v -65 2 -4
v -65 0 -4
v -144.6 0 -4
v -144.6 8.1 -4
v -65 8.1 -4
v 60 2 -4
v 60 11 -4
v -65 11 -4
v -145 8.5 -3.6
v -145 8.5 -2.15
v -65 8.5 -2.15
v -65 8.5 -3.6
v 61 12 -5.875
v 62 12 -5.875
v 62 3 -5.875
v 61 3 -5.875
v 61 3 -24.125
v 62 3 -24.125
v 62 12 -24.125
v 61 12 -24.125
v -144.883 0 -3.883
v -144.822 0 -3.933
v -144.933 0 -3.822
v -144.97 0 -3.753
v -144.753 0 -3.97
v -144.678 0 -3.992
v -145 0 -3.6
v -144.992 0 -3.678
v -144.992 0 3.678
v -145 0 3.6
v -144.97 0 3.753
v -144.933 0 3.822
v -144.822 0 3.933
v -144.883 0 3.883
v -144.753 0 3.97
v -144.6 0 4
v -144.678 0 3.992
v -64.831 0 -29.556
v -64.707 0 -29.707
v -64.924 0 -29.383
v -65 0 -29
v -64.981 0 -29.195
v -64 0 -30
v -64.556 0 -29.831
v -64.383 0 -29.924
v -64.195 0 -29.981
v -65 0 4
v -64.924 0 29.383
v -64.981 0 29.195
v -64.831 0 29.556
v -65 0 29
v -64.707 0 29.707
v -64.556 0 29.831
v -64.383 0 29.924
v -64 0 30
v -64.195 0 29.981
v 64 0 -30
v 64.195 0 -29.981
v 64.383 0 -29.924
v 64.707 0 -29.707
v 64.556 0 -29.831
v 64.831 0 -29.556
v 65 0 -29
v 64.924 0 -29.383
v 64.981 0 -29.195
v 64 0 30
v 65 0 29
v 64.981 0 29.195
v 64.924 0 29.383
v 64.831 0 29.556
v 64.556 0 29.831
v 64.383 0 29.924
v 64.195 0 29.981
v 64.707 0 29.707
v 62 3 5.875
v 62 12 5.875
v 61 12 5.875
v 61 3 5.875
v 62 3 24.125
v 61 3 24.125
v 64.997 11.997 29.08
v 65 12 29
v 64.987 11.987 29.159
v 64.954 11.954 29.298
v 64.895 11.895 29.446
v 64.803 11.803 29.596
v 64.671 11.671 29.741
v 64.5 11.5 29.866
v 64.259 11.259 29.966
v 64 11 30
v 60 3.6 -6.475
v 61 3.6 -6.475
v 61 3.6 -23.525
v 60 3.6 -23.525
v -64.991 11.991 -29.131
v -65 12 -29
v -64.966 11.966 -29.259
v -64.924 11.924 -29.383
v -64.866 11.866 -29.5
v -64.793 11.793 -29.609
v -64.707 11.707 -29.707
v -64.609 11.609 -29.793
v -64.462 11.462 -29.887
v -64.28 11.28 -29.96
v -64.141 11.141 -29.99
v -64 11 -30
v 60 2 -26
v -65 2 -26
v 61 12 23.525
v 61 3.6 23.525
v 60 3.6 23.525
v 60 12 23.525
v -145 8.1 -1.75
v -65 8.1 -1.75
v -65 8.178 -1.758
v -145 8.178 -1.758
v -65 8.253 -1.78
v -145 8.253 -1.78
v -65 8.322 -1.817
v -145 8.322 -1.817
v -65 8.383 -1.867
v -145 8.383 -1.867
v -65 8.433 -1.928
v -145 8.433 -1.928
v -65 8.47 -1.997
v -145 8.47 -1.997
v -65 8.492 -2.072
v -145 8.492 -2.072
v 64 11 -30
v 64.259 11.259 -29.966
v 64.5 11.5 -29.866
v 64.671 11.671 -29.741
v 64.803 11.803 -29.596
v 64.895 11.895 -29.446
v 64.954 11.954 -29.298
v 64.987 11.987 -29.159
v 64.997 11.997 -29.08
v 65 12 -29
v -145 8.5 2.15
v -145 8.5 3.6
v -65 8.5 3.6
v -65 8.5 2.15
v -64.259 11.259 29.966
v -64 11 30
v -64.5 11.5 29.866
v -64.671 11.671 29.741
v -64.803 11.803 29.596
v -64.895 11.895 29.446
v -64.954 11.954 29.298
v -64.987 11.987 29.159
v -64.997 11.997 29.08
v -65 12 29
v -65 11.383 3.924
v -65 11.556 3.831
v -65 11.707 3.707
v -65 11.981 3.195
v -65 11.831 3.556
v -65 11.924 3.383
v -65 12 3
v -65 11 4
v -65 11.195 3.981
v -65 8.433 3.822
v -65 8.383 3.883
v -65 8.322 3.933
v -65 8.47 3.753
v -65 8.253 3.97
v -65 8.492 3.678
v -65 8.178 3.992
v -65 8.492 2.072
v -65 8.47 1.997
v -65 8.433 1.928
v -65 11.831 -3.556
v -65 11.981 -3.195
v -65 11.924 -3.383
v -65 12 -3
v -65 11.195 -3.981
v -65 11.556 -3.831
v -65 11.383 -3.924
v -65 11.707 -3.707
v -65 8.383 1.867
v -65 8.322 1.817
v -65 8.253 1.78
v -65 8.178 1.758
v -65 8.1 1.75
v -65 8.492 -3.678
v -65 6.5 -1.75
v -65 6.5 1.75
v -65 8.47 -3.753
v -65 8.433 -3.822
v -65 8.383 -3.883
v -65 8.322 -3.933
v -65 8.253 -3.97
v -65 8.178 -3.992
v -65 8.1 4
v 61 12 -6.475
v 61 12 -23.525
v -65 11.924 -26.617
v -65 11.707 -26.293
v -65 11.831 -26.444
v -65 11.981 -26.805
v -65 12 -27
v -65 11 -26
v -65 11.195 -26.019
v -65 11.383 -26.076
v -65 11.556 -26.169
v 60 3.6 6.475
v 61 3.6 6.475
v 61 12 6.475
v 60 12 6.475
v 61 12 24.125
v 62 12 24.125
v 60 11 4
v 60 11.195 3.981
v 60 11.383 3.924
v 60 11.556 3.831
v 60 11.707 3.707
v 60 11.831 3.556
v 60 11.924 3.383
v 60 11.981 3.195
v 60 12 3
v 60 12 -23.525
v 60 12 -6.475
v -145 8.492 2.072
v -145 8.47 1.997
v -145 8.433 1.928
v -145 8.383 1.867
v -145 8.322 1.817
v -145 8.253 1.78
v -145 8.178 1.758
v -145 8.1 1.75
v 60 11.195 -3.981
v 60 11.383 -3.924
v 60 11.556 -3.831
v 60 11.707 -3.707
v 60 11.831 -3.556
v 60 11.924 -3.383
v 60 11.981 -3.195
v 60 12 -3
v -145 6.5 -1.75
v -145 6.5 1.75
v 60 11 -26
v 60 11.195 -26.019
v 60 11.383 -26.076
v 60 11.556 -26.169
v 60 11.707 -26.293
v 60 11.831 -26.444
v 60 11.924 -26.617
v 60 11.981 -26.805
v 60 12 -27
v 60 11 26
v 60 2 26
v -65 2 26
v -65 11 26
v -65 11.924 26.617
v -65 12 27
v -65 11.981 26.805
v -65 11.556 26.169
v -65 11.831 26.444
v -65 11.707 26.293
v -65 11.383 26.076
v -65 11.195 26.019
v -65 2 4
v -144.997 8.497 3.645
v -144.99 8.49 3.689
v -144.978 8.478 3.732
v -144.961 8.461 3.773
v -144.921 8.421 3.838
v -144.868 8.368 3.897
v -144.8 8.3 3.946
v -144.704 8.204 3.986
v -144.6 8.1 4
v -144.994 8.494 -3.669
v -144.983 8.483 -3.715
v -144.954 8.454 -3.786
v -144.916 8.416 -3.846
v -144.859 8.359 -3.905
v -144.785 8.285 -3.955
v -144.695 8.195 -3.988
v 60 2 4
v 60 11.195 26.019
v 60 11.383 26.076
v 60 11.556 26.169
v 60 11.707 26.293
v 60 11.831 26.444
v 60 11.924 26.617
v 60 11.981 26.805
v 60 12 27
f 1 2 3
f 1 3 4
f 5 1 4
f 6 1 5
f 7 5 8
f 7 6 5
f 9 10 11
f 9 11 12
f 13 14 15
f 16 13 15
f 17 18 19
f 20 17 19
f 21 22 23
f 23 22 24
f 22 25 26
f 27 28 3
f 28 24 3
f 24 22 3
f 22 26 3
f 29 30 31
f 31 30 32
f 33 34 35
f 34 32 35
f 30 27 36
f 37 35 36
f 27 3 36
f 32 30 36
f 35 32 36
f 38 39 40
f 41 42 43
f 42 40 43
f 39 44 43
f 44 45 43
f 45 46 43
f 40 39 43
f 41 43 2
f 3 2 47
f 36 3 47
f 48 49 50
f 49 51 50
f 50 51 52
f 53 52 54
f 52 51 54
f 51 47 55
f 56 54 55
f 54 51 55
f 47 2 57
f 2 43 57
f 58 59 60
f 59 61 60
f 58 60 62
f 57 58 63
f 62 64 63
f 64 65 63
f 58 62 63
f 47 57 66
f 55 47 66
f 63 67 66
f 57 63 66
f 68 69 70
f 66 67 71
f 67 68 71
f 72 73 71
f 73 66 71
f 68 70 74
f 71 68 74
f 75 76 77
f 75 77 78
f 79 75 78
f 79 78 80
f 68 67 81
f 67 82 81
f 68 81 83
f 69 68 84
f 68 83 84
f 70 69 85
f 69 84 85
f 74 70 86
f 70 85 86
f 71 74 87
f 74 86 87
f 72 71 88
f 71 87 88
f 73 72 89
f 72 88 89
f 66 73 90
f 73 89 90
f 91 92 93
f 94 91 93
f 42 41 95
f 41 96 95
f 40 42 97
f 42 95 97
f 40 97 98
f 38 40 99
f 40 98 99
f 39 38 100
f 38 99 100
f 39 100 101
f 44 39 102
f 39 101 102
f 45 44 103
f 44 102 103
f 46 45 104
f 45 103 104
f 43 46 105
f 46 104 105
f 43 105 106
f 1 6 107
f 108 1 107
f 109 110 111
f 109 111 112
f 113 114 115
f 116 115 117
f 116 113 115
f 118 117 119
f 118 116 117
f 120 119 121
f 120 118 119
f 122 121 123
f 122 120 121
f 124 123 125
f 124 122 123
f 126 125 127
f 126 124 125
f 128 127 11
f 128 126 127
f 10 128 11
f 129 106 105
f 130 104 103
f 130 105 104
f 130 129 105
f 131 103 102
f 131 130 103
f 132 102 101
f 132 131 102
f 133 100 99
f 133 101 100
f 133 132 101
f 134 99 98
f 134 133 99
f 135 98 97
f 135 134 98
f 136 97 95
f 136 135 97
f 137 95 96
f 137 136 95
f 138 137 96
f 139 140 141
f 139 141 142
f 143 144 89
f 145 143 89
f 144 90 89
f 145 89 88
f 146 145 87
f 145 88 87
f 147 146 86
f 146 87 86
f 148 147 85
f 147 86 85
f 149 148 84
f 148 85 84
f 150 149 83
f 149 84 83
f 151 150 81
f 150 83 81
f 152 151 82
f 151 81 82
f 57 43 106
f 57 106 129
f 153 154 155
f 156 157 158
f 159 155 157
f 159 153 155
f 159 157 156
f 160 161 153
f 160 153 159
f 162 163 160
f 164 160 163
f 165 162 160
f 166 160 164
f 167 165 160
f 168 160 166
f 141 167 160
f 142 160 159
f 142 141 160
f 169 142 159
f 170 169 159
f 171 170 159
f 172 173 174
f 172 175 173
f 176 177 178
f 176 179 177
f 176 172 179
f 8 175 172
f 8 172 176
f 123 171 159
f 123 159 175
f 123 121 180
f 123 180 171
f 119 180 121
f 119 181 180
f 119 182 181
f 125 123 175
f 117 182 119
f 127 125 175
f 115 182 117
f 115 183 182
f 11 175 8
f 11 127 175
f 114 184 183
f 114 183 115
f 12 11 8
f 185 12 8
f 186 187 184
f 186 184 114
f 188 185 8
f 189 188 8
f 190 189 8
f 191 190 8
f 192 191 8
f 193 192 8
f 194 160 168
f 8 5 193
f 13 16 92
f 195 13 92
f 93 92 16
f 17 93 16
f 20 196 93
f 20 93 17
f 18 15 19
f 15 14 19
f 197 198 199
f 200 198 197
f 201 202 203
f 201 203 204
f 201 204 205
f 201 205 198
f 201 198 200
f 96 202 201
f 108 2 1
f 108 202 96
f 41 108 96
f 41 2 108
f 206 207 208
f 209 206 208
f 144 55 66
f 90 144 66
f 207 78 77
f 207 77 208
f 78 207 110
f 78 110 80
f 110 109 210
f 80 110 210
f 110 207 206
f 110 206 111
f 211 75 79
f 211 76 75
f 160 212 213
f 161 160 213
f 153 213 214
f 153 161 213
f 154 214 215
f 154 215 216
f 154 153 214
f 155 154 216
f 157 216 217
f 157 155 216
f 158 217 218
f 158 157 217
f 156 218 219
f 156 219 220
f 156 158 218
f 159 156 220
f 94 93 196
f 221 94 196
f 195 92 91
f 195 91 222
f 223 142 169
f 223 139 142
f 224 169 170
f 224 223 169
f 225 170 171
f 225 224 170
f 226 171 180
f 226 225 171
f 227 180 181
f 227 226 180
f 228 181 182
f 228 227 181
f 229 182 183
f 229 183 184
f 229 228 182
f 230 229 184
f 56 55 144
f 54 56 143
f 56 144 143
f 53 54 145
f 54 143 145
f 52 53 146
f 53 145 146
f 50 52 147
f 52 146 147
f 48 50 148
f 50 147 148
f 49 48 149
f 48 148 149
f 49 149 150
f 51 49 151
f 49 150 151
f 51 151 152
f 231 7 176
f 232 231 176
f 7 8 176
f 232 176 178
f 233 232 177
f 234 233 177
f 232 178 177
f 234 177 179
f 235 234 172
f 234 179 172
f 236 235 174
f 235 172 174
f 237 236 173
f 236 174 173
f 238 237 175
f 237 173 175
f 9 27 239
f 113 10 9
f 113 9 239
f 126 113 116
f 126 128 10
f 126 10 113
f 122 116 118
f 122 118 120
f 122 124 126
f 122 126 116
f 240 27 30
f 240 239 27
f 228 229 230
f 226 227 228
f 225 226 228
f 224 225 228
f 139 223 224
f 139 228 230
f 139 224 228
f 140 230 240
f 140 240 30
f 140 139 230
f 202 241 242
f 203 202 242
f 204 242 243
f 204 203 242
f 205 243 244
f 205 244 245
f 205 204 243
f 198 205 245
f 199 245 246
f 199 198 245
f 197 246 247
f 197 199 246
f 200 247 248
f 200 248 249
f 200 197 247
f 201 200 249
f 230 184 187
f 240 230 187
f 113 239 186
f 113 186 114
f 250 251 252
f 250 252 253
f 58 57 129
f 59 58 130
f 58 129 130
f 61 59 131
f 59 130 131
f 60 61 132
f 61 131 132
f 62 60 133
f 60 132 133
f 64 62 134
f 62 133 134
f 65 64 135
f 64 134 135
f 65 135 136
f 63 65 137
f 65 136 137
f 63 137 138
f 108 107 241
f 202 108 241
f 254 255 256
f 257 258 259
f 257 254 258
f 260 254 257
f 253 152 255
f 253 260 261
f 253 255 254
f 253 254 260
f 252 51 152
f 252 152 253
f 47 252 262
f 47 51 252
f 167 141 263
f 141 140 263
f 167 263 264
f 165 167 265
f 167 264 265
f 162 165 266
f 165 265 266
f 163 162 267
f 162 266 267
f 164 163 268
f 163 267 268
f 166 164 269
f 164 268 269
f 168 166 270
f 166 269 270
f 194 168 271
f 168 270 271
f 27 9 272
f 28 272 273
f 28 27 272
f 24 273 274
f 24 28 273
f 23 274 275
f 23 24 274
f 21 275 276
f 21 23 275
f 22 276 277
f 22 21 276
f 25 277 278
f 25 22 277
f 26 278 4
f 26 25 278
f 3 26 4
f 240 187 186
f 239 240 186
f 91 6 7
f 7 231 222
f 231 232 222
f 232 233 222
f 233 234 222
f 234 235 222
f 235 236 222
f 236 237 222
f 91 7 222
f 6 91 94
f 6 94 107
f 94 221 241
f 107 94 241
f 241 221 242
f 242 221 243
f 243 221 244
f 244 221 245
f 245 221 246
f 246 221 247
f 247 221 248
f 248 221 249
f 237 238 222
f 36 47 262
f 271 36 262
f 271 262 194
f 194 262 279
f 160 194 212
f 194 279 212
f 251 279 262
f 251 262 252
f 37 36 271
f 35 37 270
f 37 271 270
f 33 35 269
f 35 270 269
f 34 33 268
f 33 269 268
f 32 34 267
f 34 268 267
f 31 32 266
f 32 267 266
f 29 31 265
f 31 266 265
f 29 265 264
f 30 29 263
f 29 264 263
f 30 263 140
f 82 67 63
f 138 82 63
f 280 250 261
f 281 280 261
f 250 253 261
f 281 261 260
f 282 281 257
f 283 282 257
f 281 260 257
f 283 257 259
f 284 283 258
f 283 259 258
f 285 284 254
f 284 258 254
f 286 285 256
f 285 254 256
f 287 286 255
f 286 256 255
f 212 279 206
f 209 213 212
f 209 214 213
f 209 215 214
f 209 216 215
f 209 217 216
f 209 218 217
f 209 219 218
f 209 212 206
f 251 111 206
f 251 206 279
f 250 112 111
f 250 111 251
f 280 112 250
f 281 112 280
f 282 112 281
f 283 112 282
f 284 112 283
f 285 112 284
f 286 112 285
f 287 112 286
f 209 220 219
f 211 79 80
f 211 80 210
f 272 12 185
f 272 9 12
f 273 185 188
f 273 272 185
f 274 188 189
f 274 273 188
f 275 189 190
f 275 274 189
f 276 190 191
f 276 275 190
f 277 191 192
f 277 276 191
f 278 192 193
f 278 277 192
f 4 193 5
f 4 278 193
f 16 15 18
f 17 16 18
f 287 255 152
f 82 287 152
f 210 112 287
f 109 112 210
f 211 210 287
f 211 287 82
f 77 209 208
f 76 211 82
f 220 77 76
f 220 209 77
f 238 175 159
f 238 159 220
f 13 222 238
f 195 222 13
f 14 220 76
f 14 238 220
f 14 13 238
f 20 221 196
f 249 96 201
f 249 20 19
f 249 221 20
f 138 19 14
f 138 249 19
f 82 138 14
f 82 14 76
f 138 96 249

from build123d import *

# Parameters (mm, degrees)
SKETCH1_W           = 130
SKETCH1_H           = 60
BOSS_EXTRUDE1_DEPTH = 12
CUT_EXTRUDE1_START  = -5
SKETCH2_W           = 22
SKETCH2_H           = 10
CUT_EXTRUDE1_DEPTH  = 129.955216397
CUT_EXTRUDE2_START  = -2
SKETCH3_W           = 0.6
SKETCH3_H           = 8.4
SKETCH3_H_2         = 0.6
SKETCH3_W_2         = 17.05
CUT_EXTRUDE2_DEPTH  = 1
CUT_EXTRUDE3_START  = -2
SKETCH3_3_W         = 17.05
SKETCH3_3_H         = 8.4
CUT_EXTRUDE3_DEPTH  = 2
BOSS_EXTRUDE2_DEPTH = 80
FILLET1_R           = 0.4
FILLET2_R           = 1


with BuildPart() as part:
    # Sketch1 → Boss-Extrude1 (new body)
    with BuildSketch(Plane(origin=(0, 0, 0), x_dir=(1, 0, 0), z_dir=(0, 1, 0))):
        Rectangle(SKETCH1_W, SKETCH1_H)
    extrude(amount=BOSS_EXTRUDE1_DEPTH)

    # Sketch2 → Cut-Extrude1 (cut, through all)
    with BuildSketch(Plane(origin=(65, 0, 0), x_dir=(0, 0, -1), z_dir=(1, 0, 0)).offset(CUT_EXTRUDE1_START)):
        with Locations((15, 7)):
            Rectangle(SKETCH2_W, SKETCH2_H)
    cut_extrude1 = extrude(amount=-CUT_EXTRUDE1_DEPTH, mode=Mode.SUBTRACT)

    # Mirror1: Cut-Extrude1 across plane
    add(cut_extrude1.mirror(Plane.XY), mode=Mode.SUBTRACT)

    # Sketch3 → Cut-Extrude2 (cut)
    with BuildSketch(Plane.ZY.offset(-60).offset(CUT_EXTRUDE2_START)):
        with Locations((23.825, 7.8)):
            Rectangle(SKETCH3_W, SKETCH3_H)
        with Locations((23.825, 3.3)):
            Rectangle(SKETCH3_W, SKETCH3_H_2)
        with Locations((15, 7.8)):
            Rectangle(SKETCH3_W_2, SKETCH3_H)
        with Locations((15, 3.3)):
            Rectangle(SKETCH3_W_2, SKETCH3_H_2)
        with Locations((6.175, 3.3)):
            Rectangle(SKETCH3_W, SKETCH3_H_2)
        with Locations((6.175, 7.8)):
            Rectangle(SKETCH3_W, SKETCH3_H)
    cut_extrude2 = extrude(amount=CUT_EXTRUDE2_DEPTH, mode=Mode.SUBTRACT)

    # Sketch3<3> → Cut-Extrude3 (cut)
    with BuildSketch(Plane.ZY.offset(-60).offset(CUT_EXTRUDE3_START)):
        with Locations((15, 7.8)):
            Rectangle(SKETCH3_3_W, SKETCH3_3_H)
    cut_extrude3 = extrude(amount=CUT_EXTRUDE3_DEPTH, mode=Mode.SUBTRACT)

    # Mirror2: Cut-Extrude2, Cut-Extrude3 across plane
    add(cut_extrude2.mirror(Plane.XY), mode=Mode.SUBTRACT)
    add(cut_extrude3.mirror(Plane.XY), mode=Mode.SUBTRACT)

    # Sketch4 → Boss-Extrude2 (add)
    with BuildSketch(Plane.ZY.offset(65)):
        Polygon((4, 2), (4, 8.5), (1.75, 8.5), (1.75, 6.5), (-1.75, 6.5), (-1.75, 8.5), (-4, 8.5), (-4, 2), (-4, 0), (4, 0), align=None)
    extrude(amount=BOSS_EXTRUDE2_DEPTH)

    # Fillet1
    fillet1_edges = [part.edges().sort_by_distance(p)[0] for p in [
        (-105, 8.5, -1.75),
        (-105, 8.5, -4),
        (-145, 4.25, 4),
        (-105, 8.5, 4),
        (-105, 8.5, 1.75),
        (-145, 4.25, -4),
    ]]
    fillet(fillet1_edges, radius=FILLET1_R)

    # Fillet2
    fillet2_edges = [part.edges().sort_by_distance(p)[0] for p in [
        (0, 12, 30),
        (-2.5, 12, -4),
        (-2.5, 12, -26),
        (-2.5, 12, 26),
        (-2.5, 12, 4),
        (65, 6, 30),
        (-65, 6, 30),
        (-65, 6, -30),
        (65, 6, -30),
        (0, 12, -30),
    ]]
    fillet(fillet2_edges, radius=FILLET2_R)


solid = part.part
